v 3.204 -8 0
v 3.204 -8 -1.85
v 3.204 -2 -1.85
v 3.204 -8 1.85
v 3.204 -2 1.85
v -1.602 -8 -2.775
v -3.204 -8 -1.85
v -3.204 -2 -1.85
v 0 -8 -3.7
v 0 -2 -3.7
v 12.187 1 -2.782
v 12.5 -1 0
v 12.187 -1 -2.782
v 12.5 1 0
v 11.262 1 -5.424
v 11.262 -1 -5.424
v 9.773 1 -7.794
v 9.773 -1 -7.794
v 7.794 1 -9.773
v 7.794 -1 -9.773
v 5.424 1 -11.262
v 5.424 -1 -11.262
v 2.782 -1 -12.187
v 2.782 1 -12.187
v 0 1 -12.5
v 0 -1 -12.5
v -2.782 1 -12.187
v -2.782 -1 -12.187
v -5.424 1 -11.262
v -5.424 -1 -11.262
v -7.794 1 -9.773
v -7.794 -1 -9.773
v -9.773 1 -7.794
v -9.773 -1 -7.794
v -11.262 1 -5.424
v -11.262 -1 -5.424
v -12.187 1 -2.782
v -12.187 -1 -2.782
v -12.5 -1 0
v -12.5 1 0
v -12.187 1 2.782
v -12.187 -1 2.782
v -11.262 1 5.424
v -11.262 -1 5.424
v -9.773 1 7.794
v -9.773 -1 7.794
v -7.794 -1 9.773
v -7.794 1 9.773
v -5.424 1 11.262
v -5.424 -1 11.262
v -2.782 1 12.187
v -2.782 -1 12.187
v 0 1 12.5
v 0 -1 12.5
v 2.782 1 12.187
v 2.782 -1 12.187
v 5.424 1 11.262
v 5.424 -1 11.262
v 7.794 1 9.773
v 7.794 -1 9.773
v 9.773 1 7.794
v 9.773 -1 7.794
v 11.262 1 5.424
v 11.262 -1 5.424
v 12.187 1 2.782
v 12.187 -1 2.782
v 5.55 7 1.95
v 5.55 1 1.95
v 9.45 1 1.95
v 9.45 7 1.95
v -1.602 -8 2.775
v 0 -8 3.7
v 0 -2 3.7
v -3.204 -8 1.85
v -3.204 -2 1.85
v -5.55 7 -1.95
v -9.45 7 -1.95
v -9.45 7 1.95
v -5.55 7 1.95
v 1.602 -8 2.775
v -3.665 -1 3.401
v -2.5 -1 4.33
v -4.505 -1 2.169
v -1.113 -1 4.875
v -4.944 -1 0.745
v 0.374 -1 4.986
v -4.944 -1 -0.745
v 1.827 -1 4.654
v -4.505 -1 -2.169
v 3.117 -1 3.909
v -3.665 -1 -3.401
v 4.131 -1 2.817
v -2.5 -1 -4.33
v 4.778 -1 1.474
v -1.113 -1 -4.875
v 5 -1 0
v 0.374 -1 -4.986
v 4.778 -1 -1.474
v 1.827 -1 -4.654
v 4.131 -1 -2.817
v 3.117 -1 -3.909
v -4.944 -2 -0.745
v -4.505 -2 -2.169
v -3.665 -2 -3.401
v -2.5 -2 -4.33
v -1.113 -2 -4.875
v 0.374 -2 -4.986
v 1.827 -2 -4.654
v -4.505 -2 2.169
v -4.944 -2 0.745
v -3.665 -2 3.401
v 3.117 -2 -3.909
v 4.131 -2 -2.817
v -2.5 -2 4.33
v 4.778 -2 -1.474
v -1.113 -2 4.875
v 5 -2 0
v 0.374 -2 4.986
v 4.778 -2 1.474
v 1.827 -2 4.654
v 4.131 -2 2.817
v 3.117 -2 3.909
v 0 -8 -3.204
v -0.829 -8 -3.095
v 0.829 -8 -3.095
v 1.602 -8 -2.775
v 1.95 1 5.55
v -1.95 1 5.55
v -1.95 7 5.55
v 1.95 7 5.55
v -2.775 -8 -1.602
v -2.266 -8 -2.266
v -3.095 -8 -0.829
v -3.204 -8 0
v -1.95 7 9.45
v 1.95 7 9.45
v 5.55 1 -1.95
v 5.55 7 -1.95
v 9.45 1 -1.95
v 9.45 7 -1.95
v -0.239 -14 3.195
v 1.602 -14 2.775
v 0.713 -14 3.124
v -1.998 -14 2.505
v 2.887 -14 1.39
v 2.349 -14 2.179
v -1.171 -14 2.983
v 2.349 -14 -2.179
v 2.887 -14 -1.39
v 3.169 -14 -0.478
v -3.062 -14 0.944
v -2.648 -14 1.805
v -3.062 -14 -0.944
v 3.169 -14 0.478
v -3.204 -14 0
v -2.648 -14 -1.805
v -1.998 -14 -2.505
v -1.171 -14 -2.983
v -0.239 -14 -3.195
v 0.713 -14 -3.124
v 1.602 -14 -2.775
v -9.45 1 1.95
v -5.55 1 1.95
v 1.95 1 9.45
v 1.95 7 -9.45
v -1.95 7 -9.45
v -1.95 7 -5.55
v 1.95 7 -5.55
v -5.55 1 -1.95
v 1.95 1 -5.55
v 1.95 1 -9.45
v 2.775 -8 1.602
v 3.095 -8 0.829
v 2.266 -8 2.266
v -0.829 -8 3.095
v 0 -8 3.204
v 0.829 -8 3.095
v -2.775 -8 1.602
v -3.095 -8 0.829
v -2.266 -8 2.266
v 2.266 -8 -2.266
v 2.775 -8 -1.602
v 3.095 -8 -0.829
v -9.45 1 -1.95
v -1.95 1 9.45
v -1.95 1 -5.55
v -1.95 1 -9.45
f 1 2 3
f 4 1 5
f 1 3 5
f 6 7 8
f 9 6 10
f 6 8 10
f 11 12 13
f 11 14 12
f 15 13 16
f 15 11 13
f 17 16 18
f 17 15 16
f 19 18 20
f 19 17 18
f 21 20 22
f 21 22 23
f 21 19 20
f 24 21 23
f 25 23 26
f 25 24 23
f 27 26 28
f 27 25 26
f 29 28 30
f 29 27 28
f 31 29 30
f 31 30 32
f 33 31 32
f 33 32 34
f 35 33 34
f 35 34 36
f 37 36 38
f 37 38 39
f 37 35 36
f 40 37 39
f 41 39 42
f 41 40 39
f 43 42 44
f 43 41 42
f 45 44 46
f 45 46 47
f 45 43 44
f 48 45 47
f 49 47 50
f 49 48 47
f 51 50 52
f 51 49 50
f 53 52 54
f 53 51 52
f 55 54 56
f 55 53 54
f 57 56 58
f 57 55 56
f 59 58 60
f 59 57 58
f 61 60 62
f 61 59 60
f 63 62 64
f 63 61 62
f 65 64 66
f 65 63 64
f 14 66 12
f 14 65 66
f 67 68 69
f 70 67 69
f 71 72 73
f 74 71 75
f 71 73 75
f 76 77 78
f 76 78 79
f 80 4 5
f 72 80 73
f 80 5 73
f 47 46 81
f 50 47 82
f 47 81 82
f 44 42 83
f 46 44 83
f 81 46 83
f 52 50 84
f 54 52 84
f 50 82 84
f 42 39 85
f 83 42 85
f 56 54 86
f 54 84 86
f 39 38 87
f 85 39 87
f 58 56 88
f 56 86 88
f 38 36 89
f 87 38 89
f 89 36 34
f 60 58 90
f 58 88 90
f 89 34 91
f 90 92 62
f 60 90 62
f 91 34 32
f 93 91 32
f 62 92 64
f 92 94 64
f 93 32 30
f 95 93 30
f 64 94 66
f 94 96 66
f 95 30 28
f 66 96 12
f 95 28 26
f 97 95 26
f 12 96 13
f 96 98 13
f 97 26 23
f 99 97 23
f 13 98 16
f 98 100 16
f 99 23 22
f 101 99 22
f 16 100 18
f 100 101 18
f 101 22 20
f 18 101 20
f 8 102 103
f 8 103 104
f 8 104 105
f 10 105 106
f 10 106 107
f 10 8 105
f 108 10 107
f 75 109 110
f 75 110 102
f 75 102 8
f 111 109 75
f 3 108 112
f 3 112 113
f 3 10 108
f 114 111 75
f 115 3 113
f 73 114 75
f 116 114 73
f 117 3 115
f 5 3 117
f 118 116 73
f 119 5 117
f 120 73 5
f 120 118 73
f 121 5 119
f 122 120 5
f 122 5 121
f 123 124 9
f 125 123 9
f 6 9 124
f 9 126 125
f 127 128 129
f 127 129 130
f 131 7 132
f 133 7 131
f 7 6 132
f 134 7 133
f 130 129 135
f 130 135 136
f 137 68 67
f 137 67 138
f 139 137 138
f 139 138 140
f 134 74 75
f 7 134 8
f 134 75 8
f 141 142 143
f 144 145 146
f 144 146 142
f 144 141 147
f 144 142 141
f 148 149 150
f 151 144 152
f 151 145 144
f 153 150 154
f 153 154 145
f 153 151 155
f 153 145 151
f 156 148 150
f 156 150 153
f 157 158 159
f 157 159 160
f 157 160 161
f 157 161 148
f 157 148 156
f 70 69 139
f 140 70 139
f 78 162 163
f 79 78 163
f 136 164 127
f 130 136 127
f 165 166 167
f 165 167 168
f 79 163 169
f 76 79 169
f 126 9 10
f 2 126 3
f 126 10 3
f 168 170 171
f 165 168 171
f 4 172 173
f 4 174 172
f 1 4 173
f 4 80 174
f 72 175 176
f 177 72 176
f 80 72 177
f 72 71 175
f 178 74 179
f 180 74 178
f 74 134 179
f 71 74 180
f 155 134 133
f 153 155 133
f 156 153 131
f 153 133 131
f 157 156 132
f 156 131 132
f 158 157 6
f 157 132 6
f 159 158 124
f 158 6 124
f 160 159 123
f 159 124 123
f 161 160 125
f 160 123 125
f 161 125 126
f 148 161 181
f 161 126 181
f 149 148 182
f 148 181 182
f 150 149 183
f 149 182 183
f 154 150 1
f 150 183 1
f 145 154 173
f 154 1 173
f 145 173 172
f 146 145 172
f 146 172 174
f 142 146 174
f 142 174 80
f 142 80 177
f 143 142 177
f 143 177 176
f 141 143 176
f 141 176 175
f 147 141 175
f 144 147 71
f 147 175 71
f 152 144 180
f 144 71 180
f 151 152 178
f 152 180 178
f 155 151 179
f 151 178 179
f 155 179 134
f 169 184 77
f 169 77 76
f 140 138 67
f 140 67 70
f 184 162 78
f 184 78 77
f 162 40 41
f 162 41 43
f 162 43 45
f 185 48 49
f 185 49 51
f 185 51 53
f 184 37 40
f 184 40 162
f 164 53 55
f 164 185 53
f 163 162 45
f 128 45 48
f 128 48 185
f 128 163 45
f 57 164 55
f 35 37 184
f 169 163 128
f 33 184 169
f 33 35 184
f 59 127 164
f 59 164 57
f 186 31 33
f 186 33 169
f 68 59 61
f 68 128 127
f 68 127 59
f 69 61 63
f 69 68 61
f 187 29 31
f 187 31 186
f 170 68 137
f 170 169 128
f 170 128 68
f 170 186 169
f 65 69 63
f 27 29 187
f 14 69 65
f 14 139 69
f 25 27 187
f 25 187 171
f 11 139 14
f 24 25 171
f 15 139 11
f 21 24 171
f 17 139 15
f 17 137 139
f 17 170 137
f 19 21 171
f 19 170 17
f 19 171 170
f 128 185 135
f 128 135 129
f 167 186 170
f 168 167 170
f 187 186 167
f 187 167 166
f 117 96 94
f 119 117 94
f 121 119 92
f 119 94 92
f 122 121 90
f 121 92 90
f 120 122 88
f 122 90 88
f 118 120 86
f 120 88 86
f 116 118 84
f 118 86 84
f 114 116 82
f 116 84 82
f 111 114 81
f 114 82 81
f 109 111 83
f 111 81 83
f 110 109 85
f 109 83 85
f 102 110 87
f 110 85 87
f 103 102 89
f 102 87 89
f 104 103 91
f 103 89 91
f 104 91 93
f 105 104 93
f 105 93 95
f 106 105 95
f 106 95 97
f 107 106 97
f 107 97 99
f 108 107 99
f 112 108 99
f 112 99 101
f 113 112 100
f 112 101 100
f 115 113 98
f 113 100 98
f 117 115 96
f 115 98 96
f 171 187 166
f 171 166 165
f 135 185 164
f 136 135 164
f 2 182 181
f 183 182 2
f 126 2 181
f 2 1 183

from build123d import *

# Parameters (mm, degrees)
SKETCH1_R           = 12.5
BOSS_EXTRUDE1_DEPTH = 1
SKETCH2_W           = 3.9
SKETCH2_H           = 3.9
BOSS_EXTRUDE3_DEPTH = 6
SKETCH3_R           = 5
BOSS_EXTRUDE4_DEPTH = 1
BOSS_EXTRUDE5_DEPTH = 6
SKETCH5_R           = 3.204293994
BOSS_EXTRUDE6_DEPTH = 6


with BuildPart() as part:
    # Sketch1 → Boss-Extrude1 (new body, symmetric)
    with BuildSketch(Plane(origin=(0, 0, 0), x_dir=(1, 0, 0), z_dir=(0, 1, 0))):
        Circle(SKETCH1_R)
    extrude(amount=BOSS_EXTRUDE1_DEPTH, both=True)

    # Sketch2 → Boss-Extrude3 (add)
    with BuildSketch(Plane(origin=(0, 1, 0), x_dir=(1, 0, 0), z_dir=(0, 1, 0))):
        with Locations((0, 7.5)):
            Rectangle(SKETCH2_W, SKETCH2_H)
        with Locations((7.5, 0)):
            Rectangle(SKETCH2_W, SKETCH2_H)
        with Locations((0, -7.5)):
            Rectangle(SKETCH2_W, SKETCH2_H)
        with Locations((-7.5, 0)):
            Rectangle(SKETCH2_W, SKETCH2_H)
    extrude(amount=BOSS_EXTRUDE3_DEPTH)

    # Sketch3 → Boss-Extrude4 (add)
    with BuildSketch(Plane.XZ.offset(1)):
        Circle(SKETCH3_R)
    extrude(amount=BOSS_EXTRUDE4_DEPTH)

    # Sketch4 → Boss-Extrude5 (add)
    with BuildSketch(Plane.XZ.offset(2)):
        Polygon((0, -3.7), (3.204293994, -1.85), (3.204293994, 1.85), (0, 3.7), (-3.204293994, 1.85), (-3.204293994, -1.85), align=None)
    extrude(amount=BOSS_EXTRUDE5_DEPTH)

    # Sketch5 → Boss-Extrude6 (add)
    with BuildSketch(Plane(origin=(0, -8, 0), x_dir=(-1, 0, 0), z_dir=(0, -1, 0))):
        Circle(SKETCH5_R)
    extrude(amount=BOSS_EXTRUDE6_DEPTH)


solid = part.part
